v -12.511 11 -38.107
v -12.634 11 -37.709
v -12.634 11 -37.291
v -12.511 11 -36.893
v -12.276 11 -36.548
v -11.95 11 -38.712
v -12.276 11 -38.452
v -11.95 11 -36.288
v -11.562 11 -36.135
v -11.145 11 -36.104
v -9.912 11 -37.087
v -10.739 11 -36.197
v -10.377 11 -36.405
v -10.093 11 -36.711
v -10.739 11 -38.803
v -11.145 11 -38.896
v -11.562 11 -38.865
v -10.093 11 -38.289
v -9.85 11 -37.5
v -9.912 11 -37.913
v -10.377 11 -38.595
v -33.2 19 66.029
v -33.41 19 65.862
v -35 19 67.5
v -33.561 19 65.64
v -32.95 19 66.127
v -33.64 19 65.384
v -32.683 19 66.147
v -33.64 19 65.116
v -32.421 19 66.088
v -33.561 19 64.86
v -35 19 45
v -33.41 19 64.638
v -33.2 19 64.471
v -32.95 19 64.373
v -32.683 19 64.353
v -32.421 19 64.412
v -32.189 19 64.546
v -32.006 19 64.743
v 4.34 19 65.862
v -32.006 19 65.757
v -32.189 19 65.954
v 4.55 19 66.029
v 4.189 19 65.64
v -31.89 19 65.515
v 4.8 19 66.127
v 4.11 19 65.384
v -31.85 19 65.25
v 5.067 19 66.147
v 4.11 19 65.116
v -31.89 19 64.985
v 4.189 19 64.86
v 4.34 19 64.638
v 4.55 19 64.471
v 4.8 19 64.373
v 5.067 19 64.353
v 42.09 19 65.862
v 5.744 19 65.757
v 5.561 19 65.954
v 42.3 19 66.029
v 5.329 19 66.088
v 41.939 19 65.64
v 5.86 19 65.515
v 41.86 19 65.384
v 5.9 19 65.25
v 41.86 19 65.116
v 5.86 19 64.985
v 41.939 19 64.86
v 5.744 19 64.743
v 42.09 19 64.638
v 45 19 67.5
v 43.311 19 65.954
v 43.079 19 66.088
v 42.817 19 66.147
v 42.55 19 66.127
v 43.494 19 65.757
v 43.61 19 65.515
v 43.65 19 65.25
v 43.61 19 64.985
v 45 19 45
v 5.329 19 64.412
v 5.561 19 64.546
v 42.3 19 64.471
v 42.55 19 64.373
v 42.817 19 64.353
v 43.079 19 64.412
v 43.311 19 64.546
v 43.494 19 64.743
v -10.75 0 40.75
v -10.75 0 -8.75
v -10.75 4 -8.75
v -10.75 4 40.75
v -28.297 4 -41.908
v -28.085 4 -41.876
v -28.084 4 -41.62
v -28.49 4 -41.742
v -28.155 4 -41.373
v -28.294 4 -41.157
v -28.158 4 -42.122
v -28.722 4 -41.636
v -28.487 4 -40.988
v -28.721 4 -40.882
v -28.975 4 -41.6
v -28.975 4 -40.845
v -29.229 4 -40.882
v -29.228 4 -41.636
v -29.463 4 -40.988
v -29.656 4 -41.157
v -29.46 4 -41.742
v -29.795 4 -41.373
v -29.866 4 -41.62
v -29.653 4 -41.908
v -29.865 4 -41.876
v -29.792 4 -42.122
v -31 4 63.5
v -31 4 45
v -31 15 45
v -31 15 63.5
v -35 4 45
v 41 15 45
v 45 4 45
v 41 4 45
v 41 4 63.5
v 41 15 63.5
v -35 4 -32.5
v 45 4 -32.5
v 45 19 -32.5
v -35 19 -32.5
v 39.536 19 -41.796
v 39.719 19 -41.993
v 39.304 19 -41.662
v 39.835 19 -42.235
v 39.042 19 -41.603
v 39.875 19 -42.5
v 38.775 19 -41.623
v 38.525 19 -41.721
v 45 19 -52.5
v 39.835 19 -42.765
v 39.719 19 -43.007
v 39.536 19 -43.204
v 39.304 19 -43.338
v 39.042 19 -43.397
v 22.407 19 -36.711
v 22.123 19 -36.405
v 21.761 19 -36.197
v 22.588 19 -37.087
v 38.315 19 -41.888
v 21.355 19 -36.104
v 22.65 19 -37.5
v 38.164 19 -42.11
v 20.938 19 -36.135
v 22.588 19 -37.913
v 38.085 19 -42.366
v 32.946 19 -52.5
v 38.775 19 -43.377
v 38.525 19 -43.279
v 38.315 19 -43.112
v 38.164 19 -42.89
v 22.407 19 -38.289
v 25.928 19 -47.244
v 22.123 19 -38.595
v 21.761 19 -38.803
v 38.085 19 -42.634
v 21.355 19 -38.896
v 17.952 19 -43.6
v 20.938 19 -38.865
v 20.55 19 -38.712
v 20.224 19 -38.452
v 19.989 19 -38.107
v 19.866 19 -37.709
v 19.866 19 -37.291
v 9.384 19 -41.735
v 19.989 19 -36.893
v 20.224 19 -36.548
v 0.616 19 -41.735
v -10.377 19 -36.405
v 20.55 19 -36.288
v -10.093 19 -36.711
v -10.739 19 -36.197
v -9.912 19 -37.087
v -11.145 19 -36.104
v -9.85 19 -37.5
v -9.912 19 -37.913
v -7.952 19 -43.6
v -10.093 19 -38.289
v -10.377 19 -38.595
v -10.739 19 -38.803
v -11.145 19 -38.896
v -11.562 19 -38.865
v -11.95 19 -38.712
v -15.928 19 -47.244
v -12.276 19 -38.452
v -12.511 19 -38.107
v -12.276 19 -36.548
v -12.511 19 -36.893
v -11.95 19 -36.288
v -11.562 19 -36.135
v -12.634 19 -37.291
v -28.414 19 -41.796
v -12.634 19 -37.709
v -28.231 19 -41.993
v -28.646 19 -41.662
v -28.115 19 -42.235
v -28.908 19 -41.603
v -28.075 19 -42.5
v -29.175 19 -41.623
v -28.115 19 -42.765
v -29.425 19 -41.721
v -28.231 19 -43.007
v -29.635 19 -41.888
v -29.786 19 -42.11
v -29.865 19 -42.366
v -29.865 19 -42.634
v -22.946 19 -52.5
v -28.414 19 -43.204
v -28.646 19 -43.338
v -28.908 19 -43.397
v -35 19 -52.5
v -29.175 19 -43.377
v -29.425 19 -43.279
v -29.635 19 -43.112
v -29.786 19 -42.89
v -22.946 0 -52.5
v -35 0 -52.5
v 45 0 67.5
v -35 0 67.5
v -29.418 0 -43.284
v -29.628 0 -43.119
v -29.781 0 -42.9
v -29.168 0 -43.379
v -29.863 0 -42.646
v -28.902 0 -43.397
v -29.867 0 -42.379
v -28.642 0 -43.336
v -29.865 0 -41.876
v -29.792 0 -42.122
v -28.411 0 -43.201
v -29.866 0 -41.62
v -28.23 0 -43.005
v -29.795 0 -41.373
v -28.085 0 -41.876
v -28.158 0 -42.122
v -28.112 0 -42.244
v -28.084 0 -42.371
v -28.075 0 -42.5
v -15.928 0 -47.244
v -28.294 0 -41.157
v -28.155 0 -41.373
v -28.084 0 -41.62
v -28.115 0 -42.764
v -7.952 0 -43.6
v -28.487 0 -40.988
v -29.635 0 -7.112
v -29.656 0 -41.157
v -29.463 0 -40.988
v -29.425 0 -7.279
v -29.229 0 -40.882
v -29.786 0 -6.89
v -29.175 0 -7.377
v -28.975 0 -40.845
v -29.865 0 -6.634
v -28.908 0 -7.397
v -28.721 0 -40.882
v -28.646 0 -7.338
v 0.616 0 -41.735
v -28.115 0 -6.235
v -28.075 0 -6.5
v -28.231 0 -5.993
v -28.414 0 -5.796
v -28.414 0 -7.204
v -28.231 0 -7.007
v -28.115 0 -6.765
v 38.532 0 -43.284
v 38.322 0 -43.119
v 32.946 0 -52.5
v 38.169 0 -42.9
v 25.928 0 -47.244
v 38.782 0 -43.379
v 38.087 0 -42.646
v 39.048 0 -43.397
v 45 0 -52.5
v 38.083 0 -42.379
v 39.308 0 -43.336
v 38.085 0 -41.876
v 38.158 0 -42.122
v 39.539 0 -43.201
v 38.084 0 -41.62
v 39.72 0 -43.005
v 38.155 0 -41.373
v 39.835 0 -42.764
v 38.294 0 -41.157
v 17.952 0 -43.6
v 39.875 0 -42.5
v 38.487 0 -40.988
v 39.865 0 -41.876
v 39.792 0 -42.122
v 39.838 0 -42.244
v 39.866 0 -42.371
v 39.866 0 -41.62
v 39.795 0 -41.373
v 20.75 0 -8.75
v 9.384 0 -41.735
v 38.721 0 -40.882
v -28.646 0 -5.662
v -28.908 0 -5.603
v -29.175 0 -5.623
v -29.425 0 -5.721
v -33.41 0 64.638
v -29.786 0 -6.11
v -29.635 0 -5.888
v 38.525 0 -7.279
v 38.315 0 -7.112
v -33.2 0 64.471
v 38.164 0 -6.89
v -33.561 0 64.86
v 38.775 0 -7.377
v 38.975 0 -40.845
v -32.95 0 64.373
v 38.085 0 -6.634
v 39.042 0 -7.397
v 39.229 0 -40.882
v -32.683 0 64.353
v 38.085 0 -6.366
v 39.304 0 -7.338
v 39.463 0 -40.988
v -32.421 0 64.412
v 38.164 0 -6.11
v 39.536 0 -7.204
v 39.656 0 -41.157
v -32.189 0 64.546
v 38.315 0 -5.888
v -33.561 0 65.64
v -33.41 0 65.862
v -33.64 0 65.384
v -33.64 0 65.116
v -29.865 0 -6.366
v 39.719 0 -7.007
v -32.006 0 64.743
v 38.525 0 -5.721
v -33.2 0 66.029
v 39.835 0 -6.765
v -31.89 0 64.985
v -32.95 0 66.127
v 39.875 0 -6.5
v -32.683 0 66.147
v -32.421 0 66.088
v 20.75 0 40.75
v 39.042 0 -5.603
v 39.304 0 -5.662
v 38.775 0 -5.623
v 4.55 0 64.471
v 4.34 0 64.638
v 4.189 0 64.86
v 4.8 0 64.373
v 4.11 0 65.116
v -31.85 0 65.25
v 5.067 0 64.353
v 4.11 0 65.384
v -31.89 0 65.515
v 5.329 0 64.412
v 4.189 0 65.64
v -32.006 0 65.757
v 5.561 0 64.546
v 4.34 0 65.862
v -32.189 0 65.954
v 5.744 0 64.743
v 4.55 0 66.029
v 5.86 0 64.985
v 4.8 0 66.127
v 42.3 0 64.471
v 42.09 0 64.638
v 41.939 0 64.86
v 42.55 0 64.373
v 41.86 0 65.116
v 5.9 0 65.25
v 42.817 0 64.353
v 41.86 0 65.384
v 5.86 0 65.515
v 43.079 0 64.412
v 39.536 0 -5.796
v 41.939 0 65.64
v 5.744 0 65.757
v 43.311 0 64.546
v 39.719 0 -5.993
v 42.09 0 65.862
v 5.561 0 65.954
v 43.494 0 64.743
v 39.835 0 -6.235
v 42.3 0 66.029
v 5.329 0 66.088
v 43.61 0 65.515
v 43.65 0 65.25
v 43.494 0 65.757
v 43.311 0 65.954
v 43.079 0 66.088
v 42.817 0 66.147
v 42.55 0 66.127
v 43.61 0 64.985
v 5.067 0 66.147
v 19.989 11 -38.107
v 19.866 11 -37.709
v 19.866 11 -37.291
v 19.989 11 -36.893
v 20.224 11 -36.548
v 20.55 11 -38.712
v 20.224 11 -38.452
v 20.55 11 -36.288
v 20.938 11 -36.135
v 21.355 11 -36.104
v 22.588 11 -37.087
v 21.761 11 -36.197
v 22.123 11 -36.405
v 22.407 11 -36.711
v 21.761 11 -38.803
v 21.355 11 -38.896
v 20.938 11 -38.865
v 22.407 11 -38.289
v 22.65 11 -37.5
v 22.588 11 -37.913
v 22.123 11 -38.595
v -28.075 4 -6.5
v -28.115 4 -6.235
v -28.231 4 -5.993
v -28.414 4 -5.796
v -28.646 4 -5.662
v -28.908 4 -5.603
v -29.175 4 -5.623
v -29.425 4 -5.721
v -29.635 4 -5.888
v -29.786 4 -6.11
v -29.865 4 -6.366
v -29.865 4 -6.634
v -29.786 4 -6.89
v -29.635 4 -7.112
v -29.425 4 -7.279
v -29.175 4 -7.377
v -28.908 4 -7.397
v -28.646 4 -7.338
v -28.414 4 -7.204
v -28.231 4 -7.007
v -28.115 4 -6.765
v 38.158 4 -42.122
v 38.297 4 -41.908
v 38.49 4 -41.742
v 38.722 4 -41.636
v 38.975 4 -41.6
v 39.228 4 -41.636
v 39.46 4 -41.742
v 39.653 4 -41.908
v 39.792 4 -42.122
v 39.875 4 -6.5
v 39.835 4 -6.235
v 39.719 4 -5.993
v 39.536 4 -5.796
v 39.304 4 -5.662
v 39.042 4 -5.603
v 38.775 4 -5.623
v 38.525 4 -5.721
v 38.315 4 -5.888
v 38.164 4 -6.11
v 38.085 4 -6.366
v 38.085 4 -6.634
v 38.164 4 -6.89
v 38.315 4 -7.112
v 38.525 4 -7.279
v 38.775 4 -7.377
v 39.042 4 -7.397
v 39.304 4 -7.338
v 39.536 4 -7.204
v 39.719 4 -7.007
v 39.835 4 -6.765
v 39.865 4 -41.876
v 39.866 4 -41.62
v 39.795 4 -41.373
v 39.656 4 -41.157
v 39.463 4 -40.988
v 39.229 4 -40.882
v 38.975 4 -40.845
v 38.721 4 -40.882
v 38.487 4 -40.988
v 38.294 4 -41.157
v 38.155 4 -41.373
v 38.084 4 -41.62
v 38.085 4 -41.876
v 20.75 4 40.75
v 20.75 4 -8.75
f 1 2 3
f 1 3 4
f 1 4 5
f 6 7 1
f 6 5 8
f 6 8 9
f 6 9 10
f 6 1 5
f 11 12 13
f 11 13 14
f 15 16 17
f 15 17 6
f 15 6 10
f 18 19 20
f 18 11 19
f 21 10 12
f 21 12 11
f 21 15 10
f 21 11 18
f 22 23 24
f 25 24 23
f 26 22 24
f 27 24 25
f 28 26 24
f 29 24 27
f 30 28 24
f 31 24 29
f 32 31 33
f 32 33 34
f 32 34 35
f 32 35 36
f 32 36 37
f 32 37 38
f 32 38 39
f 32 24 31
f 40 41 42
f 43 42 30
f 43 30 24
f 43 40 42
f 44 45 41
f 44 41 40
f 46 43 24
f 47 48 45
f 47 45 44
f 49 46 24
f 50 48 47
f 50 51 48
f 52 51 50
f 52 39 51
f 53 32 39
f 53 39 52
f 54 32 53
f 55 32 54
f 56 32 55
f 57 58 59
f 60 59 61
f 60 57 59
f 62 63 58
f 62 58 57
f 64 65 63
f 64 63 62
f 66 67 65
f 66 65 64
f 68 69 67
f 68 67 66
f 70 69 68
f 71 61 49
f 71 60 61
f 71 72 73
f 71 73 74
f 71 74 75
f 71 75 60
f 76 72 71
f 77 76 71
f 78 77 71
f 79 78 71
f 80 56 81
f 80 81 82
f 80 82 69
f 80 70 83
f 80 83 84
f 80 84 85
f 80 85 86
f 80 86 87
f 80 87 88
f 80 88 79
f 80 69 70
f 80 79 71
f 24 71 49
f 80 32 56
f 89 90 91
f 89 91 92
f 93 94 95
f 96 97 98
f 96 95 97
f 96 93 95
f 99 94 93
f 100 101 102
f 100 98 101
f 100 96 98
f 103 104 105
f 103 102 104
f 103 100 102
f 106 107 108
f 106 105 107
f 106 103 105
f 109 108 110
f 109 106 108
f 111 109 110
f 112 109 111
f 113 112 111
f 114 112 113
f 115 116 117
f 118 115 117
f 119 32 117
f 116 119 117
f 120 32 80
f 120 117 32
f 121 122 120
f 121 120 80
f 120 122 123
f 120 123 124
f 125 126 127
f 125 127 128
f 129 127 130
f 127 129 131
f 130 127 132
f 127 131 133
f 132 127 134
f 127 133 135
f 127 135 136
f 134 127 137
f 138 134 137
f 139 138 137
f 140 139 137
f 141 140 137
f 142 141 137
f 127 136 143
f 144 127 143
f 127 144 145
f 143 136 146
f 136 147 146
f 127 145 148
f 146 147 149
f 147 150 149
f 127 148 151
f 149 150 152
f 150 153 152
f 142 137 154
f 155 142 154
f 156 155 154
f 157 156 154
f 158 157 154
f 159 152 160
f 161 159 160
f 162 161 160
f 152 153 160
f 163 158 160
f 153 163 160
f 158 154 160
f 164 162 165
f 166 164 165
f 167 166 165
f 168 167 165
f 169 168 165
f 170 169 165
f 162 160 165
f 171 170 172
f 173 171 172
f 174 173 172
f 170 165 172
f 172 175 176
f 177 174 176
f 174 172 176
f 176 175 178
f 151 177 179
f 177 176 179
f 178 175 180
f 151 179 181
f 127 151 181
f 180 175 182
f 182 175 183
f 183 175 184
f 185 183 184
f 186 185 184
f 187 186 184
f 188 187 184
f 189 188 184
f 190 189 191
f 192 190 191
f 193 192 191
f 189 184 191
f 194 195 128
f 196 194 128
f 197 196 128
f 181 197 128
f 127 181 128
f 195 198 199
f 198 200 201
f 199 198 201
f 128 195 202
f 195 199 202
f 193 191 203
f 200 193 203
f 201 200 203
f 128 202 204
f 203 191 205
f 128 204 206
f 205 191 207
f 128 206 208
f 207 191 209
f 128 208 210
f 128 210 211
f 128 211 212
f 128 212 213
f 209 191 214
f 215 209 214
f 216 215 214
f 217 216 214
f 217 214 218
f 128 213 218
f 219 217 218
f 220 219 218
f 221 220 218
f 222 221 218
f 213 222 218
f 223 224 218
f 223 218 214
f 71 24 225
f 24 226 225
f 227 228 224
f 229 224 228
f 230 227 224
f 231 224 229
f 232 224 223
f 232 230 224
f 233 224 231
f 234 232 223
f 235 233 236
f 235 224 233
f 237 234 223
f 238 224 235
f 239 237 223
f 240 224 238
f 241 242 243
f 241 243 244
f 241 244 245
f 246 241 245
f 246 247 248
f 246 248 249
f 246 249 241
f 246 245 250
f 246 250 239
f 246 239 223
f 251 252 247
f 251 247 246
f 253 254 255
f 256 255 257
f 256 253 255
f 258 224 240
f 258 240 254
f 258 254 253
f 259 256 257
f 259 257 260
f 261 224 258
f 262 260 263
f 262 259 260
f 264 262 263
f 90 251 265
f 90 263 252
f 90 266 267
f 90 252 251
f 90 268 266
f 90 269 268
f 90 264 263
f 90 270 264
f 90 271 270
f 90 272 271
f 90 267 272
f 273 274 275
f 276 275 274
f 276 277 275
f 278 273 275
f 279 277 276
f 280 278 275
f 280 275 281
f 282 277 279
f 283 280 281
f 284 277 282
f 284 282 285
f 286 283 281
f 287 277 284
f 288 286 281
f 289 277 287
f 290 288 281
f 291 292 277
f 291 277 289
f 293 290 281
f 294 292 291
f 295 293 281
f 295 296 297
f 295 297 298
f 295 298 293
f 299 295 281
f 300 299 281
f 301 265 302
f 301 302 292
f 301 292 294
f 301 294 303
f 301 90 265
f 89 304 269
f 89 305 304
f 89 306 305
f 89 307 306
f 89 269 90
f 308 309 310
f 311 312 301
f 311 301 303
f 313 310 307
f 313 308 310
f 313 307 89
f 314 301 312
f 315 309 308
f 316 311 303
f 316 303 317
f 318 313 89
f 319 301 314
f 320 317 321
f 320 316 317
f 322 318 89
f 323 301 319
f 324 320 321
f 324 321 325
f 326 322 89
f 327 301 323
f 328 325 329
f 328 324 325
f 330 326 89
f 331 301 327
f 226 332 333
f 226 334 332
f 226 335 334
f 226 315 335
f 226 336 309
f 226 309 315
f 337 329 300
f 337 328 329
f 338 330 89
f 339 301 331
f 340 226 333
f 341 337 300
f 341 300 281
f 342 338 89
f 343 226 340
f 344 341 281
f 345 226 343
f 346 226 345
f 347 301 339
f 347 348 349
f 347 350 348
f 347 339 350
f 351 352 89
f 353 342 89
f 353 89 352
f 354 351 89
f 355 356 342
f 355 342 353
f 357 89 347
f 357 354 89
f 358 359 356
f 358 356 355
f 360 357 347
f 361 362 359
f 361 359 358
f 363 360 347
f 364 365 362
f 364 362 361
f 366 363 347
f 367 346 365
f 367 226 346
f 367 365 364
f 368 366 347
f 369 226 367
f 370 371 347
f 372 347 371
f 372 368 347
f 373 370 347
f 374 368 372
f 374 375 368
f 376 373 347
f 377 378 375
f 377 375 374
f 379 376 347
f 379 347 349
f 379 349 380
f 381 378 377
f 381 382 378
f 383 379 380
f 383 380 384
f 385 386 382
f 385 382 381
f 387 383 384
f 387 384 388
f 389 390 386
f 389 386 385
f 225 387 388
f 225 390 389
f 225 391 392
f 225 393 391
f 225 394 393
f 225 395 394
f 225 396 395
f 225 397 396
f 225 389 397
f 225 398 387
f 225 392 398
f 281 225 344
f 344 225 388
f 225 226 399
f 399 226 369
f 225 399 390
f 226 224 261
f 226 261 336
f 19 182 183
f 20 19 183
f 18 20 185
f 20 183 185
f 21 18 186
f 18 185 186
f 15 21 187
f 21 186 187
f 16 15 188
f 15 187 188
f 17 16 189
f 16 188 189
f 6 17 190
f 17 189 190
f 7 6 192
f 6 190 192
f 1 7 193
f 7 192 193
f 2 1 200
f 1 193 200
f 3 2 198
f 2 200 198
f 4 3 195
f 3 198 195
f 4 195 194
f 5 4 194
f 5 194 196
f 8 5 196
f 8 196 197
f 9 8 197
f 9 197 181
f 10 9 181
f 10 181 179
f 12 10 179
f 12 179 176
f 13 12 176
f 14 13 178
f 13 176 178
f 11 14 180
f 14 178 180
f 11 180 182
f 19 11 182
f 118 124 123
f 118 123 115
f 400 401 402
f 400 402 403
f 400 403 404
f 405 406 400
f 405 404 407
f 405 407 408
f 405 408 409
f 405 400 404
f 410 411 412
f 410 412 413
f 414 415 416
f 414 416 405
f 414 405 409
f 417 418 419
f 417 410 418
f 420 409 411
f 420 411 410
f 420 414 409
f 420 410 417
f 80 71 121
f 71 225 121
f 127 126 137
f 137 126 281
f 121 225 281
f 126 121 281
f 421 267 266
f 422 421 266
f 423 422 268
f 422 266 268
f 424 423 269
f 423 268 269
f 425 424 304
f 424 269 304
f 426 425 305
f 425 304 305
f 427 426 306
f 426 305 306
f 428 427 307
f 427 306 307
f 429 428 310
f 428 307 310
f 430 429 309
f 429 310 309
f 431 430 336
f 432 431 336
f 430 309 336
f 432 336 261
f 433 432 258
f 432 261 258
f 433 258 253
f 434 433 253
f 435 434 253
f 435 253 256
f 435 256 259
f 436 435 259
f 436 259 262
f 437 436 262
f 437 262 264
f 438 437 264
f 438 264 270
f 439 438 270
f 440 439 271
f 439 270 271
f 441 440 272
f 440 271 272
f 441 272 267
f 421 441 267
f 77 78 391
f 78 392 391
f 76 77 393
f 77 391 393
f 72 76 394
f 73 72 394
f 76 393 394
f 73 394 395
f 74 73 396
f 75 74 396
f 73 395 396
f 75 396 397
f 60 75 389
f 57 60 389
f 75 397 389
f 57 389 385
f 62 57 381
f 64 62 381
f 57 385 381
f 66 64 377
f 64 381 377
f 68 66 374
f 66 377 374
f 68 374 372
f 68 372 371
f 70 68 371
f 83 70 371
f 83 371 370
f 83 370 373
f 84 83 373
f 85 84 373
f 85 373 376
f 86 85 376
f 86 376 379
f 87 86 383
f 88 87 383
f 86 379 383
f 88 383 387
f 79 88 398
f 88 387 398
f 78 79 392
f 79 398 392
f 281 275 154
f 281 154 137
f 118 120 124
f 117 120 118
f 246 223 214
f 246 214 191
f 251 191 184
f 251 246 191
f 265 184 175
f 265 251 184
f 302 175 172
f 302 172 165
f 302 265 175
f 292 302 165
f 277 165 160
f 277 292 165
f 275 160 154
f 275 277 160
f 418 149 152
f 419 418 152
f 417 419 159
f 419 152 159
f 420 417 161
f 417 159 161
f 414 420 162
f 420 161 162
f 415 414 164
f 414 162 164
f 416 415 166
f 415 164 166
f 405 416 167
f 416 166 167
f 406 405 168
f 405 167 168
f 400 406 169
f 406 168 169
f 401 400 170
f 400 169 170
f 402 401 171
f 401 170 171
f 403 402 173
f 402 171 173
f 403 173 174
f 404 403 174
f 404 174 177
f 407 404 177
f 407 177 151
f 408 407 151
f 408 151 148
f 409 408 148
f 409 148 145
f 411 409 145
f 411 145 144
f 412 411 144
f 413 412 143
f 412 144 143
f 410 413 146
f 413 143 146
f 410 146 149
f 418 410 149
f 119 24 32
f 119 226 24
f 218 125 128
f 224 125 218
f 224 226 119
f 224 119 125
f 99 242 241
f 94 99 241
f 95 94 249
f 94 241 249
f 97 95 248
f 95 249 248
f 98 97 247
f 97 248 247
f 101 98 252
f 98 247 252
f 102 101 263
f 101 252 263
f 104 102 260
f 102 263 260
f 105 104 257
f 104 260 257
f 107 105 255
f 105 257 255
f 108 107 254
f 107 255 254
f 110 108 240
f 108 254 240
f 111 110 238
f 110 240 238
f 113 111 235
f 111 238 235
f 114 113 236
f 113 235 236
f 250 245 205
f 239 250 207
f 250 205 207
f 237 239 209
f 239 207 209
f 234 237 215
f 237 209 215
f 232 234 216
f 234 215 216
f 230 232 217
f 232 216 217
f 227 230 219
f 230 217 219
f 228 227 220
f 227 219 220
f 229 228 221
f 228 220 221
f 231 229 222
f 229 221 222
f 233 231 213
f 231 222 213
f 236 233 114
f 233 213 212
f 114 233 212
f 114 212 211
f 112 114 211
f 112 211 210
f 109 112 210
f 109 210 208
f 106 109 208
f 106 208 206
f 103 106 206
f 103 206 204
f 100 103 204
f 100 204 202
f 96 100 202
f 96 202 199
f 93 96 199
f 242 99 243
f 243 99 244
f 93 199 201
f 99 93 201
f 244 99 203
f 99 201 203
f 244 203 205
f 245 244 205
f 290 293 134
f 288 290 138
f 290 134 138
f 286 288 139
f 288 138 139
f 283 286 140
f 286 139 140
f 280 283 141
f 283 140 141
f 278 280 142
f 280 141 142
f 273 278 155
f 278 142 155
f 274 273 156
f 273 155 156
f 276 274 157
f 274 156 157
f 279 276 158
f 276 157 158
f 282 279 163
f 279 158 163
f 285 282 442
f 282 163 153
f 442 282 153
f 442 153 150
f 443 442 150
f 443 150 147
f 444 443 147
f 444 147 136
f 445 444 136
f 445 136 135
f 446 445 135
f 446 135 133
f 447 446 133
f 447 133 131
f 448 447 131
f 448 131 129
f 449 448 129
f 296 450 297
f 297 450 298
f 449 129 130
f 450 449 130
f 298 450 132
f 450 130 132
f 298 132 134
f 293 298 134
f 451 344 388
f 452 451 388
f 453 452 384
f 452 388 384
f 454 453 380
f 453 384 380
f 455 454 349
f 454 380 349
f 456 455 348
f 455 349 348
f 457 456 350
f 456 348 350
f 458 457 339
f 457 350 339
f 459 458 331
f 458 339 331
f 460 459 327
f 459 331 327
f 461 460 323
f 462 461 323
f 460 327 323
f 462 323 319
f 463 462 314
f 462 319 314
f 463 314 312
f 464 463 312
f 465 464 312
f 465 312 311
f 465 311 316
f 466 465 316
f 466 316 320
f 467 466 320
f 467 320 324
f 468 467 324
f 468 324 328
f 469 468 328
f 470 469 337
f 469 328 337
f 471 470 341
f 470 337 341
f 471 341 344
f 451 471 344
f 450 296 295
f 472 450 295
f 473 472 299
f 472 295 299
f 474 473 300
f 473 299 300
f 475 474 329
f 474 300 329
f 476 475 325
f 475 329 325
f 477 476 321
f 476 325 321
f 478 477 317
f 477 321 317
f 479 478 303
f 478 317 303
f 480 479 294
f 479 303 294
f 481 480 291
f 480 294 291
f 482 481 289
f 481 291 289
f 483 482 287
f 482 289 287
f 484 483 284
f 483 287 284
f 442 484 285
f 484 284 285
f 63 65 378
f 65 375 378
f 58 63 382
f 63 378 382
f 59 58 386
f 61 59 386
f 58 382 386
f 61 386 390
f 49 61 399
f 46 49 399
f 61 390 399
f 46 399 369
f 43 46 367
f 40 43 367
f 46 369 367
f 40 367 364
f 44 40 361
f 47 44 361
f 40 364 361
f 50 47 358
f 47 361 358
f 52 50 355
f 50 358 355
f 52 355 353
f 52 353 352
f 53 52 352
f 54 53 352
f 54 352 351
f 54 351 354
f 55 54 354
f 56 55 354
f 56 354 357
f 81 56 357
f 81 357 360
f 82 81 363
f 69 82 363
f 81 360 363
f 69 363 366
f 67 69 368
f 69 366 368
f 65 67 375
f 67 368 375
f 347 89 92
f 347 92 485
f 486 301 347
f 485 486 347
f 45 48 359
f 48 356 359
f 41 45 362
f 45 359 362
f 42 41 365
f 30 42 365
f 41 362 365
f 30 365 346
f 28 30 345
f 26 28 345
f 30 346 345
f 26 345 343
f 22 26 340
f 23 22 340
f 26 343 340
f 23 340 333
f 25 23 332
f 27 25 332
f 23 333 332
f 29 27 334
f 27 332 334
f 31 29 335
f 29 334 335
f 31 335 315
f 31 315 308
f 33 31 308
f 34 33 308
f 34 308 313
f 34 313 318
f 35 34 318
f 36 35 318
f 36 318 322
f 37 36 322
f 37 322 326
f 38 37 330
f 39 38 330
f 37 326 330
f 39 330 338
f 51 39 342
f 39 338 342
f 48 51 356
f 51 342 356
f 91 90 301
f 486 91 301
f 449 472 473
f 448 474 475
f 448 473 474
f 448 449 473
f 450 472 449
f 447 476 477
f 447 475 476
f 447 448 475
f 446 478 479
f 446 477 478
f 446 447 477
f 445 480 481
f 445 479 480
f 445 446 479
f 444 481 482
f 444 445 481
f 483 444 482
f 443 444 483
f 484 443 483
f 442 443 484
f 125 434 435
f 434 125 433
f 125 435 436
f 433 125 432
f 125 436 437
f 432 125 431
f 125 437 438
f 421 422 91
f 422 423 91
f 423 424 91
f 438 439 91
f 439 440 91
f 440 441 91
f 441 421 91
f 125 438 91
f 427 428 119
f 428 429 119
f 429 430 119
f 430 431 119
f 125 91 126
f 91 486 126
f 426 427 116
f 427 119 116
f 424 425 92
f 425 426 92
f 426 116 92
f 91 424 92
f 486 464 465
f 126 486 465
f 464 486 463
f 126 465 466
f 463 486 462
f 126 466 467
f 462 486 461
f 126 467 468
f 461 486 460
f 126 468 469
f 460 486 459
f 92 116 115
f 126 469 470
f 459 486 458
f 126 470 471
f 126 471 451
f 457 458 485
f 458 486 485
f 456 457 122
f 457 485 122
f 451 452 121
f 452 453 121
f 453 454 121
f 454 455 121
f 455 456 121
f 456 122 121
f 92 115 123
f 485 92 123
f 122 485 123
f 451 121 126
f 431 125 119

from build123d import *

# Parameters (mm, degrees)
SKETCH_1_R          = 0.9
SKETCH_1_W          = 31.5
SKETCH_1_H          = 49.5
EXTRUDE_1_DEPTH     = 4
SKETCH_2_W          = 80
SKETCH_2_H          = 22.5
EXTRUDE_2_DEPTH     = 15
SKETCH_3_R          = 0.9
CUT_EXTRUDE_1_DEPTH = 20
SKETCH_4_R          = 0.9
CUT_EXTRUDE_2_DEPTH = 20
SKETCH_6_W          = 72
SKETCH_6_H          = 11
CUT_EXTRUDE_3_DEPTH = 18.5
SKETCH_7_R          = 1.4
CUT_EXTRUDE_5_DEPTH = 8


with BuildPart() as part:
    # 스케치1 → 보스-돌출1 (new body)
    with BuildSketch(Plane.XZ):
        with BuildLine():
            Line((45, -52.5), (45, 67.5))
            Line((45, 67.5), (-35, 67.5))
            Line((-35, 67.5), (-35, -52.5))
            Line((-35, -52.5), (-22.946377225, -52.5))
            ThreePointArc((-22.946377225, -52.5), (5, -41.5), (32.946377225, -52.5))
            Line((32.946377225, -52.5), (45, -52.5))
        make_face()
        with Locations((-28.975, -41.744959148)):
            Circle(SKETCH_1_R, mode=Mode.SUBTRACT)
        with Locations((-28.975, -6.5)):
            Circle(SKETCH_1_R, mode=Mode.SUBTRACT)
        with Locations((-32.75, 65.25)):
            Circle(SKETCH_1_R, mode=Mode.SUBTRACT)
        with Locations((5, 65.25)):
            Circle(SKETCH_1_R, mode=Mode.SUBTRACT)
        with Locations((42.75, 65.25)):
            Circle(SKETCH_1_R, mode=Mode.SUBTRACT)
        with Locations((38.975, -6.5)):
            Circle(SKETCH_1_R, mode=Mode.SUBTRACT)
        with Locations((38.975, -41.744959148)):
            Circle(SKETCH_1_R, mode=Mode.SUBTRACT)
        with Locations((5, 16)):
            Rectangle(SKETCH_1_W, SKETCH_1_H, mode=Mode.SUBTRACT)
    extrude(amount=-EXTRUDE_1_DEPTH)

    # 스케치2 → 보스-돌출2 (add)
    with BuildSketch(Plane(origin=(0, 4, 0), x_dir=(1, 0, 0), z_dir=(0, 1, 0))):
        with Locations((5, -56.25)):
            Rectangle(SKETCH_2_W, SKETCH_2_H)
        with BuildLine():
            Line((45, 32.5), (-35, 32.5))
            Line((-35, 32.5), (-35, 52.5))
            Line((-35, 52.5), (-22.946377225, 52.5))
            ThreePointArc((-22.946377225, 52.5), (5, 41.5), (32.946377225, 52.5))
            Line((32.946377225, 52.5), (45, 52.5))
            Line((45, 52.5), (45, 32.5))
        make_face()
    extrude(amount=EXTRUDE_2_DEPTH)

    # 스케치3 → 컷-돌출1 (cut, through all)
    with BuildSketch(Plane(origin=(0, 19, 0), x_dir=(1, 0, 0), z_dir=(0, 1, 0))):
        with Locations((38.975, 42.5)):
            Circle(SKETCH_3_R)
        with Locations((-28.975, 42.5)):
            Circle(SKETCH_3_R)
    extrude(amount=-CUT_EXTRUDE_1_DEPTH, mode=Mode.SUBTRACT)

    # 스케치4 → 컷-돌출2 (cut, through all)
    with BuildSketch(Plane.XZ):
        with Locations((42.75, 65.25)):
            Circle(SKETCH_4_R)
        with Locations((5, 65.25)):
            Circle(SKETCH_4_R)
        with Locations((-32.75, 65.25)):
            Circle(SKETCH_4_R)
    extrude(amount=-CUT_EXTRUDE_2_DEPTH, mode=Mode.SUBTRACT)

    # 스케치6 → 컷-돌출3 (cut)
    with BuildSketch(Plane(origin=(0, 0, 45), x_dir=(-1, 0, 0), z_dir=(0, 0, -1))):
        with Locations((-5, 9.5)):
            Rectangle(SKETCH_6_W, SKETCH_6_H)
    extrude(amount=-CUT_EXTRUDE_3_DEPTH, mode=Mode.SUBTRACT)

    # 스케치7 → 컷-돌출5 (cut)
    with BuildSketch(Plane(origin=(0, 19, 0), x_dir=(1, 0, 0), z_dir=(0, 1, 0))):
        with Locations((21.25, 37.5)):
            Circle(SKETCH_7_R)
        with Locations((-11.25, 37.5)):
            Circle(SKETCH_7_R)
    extrude(amount=-CUT_EXTRUDE_5_DEPTH, mode=Mode.SUBTRACT)


solid = part.part
